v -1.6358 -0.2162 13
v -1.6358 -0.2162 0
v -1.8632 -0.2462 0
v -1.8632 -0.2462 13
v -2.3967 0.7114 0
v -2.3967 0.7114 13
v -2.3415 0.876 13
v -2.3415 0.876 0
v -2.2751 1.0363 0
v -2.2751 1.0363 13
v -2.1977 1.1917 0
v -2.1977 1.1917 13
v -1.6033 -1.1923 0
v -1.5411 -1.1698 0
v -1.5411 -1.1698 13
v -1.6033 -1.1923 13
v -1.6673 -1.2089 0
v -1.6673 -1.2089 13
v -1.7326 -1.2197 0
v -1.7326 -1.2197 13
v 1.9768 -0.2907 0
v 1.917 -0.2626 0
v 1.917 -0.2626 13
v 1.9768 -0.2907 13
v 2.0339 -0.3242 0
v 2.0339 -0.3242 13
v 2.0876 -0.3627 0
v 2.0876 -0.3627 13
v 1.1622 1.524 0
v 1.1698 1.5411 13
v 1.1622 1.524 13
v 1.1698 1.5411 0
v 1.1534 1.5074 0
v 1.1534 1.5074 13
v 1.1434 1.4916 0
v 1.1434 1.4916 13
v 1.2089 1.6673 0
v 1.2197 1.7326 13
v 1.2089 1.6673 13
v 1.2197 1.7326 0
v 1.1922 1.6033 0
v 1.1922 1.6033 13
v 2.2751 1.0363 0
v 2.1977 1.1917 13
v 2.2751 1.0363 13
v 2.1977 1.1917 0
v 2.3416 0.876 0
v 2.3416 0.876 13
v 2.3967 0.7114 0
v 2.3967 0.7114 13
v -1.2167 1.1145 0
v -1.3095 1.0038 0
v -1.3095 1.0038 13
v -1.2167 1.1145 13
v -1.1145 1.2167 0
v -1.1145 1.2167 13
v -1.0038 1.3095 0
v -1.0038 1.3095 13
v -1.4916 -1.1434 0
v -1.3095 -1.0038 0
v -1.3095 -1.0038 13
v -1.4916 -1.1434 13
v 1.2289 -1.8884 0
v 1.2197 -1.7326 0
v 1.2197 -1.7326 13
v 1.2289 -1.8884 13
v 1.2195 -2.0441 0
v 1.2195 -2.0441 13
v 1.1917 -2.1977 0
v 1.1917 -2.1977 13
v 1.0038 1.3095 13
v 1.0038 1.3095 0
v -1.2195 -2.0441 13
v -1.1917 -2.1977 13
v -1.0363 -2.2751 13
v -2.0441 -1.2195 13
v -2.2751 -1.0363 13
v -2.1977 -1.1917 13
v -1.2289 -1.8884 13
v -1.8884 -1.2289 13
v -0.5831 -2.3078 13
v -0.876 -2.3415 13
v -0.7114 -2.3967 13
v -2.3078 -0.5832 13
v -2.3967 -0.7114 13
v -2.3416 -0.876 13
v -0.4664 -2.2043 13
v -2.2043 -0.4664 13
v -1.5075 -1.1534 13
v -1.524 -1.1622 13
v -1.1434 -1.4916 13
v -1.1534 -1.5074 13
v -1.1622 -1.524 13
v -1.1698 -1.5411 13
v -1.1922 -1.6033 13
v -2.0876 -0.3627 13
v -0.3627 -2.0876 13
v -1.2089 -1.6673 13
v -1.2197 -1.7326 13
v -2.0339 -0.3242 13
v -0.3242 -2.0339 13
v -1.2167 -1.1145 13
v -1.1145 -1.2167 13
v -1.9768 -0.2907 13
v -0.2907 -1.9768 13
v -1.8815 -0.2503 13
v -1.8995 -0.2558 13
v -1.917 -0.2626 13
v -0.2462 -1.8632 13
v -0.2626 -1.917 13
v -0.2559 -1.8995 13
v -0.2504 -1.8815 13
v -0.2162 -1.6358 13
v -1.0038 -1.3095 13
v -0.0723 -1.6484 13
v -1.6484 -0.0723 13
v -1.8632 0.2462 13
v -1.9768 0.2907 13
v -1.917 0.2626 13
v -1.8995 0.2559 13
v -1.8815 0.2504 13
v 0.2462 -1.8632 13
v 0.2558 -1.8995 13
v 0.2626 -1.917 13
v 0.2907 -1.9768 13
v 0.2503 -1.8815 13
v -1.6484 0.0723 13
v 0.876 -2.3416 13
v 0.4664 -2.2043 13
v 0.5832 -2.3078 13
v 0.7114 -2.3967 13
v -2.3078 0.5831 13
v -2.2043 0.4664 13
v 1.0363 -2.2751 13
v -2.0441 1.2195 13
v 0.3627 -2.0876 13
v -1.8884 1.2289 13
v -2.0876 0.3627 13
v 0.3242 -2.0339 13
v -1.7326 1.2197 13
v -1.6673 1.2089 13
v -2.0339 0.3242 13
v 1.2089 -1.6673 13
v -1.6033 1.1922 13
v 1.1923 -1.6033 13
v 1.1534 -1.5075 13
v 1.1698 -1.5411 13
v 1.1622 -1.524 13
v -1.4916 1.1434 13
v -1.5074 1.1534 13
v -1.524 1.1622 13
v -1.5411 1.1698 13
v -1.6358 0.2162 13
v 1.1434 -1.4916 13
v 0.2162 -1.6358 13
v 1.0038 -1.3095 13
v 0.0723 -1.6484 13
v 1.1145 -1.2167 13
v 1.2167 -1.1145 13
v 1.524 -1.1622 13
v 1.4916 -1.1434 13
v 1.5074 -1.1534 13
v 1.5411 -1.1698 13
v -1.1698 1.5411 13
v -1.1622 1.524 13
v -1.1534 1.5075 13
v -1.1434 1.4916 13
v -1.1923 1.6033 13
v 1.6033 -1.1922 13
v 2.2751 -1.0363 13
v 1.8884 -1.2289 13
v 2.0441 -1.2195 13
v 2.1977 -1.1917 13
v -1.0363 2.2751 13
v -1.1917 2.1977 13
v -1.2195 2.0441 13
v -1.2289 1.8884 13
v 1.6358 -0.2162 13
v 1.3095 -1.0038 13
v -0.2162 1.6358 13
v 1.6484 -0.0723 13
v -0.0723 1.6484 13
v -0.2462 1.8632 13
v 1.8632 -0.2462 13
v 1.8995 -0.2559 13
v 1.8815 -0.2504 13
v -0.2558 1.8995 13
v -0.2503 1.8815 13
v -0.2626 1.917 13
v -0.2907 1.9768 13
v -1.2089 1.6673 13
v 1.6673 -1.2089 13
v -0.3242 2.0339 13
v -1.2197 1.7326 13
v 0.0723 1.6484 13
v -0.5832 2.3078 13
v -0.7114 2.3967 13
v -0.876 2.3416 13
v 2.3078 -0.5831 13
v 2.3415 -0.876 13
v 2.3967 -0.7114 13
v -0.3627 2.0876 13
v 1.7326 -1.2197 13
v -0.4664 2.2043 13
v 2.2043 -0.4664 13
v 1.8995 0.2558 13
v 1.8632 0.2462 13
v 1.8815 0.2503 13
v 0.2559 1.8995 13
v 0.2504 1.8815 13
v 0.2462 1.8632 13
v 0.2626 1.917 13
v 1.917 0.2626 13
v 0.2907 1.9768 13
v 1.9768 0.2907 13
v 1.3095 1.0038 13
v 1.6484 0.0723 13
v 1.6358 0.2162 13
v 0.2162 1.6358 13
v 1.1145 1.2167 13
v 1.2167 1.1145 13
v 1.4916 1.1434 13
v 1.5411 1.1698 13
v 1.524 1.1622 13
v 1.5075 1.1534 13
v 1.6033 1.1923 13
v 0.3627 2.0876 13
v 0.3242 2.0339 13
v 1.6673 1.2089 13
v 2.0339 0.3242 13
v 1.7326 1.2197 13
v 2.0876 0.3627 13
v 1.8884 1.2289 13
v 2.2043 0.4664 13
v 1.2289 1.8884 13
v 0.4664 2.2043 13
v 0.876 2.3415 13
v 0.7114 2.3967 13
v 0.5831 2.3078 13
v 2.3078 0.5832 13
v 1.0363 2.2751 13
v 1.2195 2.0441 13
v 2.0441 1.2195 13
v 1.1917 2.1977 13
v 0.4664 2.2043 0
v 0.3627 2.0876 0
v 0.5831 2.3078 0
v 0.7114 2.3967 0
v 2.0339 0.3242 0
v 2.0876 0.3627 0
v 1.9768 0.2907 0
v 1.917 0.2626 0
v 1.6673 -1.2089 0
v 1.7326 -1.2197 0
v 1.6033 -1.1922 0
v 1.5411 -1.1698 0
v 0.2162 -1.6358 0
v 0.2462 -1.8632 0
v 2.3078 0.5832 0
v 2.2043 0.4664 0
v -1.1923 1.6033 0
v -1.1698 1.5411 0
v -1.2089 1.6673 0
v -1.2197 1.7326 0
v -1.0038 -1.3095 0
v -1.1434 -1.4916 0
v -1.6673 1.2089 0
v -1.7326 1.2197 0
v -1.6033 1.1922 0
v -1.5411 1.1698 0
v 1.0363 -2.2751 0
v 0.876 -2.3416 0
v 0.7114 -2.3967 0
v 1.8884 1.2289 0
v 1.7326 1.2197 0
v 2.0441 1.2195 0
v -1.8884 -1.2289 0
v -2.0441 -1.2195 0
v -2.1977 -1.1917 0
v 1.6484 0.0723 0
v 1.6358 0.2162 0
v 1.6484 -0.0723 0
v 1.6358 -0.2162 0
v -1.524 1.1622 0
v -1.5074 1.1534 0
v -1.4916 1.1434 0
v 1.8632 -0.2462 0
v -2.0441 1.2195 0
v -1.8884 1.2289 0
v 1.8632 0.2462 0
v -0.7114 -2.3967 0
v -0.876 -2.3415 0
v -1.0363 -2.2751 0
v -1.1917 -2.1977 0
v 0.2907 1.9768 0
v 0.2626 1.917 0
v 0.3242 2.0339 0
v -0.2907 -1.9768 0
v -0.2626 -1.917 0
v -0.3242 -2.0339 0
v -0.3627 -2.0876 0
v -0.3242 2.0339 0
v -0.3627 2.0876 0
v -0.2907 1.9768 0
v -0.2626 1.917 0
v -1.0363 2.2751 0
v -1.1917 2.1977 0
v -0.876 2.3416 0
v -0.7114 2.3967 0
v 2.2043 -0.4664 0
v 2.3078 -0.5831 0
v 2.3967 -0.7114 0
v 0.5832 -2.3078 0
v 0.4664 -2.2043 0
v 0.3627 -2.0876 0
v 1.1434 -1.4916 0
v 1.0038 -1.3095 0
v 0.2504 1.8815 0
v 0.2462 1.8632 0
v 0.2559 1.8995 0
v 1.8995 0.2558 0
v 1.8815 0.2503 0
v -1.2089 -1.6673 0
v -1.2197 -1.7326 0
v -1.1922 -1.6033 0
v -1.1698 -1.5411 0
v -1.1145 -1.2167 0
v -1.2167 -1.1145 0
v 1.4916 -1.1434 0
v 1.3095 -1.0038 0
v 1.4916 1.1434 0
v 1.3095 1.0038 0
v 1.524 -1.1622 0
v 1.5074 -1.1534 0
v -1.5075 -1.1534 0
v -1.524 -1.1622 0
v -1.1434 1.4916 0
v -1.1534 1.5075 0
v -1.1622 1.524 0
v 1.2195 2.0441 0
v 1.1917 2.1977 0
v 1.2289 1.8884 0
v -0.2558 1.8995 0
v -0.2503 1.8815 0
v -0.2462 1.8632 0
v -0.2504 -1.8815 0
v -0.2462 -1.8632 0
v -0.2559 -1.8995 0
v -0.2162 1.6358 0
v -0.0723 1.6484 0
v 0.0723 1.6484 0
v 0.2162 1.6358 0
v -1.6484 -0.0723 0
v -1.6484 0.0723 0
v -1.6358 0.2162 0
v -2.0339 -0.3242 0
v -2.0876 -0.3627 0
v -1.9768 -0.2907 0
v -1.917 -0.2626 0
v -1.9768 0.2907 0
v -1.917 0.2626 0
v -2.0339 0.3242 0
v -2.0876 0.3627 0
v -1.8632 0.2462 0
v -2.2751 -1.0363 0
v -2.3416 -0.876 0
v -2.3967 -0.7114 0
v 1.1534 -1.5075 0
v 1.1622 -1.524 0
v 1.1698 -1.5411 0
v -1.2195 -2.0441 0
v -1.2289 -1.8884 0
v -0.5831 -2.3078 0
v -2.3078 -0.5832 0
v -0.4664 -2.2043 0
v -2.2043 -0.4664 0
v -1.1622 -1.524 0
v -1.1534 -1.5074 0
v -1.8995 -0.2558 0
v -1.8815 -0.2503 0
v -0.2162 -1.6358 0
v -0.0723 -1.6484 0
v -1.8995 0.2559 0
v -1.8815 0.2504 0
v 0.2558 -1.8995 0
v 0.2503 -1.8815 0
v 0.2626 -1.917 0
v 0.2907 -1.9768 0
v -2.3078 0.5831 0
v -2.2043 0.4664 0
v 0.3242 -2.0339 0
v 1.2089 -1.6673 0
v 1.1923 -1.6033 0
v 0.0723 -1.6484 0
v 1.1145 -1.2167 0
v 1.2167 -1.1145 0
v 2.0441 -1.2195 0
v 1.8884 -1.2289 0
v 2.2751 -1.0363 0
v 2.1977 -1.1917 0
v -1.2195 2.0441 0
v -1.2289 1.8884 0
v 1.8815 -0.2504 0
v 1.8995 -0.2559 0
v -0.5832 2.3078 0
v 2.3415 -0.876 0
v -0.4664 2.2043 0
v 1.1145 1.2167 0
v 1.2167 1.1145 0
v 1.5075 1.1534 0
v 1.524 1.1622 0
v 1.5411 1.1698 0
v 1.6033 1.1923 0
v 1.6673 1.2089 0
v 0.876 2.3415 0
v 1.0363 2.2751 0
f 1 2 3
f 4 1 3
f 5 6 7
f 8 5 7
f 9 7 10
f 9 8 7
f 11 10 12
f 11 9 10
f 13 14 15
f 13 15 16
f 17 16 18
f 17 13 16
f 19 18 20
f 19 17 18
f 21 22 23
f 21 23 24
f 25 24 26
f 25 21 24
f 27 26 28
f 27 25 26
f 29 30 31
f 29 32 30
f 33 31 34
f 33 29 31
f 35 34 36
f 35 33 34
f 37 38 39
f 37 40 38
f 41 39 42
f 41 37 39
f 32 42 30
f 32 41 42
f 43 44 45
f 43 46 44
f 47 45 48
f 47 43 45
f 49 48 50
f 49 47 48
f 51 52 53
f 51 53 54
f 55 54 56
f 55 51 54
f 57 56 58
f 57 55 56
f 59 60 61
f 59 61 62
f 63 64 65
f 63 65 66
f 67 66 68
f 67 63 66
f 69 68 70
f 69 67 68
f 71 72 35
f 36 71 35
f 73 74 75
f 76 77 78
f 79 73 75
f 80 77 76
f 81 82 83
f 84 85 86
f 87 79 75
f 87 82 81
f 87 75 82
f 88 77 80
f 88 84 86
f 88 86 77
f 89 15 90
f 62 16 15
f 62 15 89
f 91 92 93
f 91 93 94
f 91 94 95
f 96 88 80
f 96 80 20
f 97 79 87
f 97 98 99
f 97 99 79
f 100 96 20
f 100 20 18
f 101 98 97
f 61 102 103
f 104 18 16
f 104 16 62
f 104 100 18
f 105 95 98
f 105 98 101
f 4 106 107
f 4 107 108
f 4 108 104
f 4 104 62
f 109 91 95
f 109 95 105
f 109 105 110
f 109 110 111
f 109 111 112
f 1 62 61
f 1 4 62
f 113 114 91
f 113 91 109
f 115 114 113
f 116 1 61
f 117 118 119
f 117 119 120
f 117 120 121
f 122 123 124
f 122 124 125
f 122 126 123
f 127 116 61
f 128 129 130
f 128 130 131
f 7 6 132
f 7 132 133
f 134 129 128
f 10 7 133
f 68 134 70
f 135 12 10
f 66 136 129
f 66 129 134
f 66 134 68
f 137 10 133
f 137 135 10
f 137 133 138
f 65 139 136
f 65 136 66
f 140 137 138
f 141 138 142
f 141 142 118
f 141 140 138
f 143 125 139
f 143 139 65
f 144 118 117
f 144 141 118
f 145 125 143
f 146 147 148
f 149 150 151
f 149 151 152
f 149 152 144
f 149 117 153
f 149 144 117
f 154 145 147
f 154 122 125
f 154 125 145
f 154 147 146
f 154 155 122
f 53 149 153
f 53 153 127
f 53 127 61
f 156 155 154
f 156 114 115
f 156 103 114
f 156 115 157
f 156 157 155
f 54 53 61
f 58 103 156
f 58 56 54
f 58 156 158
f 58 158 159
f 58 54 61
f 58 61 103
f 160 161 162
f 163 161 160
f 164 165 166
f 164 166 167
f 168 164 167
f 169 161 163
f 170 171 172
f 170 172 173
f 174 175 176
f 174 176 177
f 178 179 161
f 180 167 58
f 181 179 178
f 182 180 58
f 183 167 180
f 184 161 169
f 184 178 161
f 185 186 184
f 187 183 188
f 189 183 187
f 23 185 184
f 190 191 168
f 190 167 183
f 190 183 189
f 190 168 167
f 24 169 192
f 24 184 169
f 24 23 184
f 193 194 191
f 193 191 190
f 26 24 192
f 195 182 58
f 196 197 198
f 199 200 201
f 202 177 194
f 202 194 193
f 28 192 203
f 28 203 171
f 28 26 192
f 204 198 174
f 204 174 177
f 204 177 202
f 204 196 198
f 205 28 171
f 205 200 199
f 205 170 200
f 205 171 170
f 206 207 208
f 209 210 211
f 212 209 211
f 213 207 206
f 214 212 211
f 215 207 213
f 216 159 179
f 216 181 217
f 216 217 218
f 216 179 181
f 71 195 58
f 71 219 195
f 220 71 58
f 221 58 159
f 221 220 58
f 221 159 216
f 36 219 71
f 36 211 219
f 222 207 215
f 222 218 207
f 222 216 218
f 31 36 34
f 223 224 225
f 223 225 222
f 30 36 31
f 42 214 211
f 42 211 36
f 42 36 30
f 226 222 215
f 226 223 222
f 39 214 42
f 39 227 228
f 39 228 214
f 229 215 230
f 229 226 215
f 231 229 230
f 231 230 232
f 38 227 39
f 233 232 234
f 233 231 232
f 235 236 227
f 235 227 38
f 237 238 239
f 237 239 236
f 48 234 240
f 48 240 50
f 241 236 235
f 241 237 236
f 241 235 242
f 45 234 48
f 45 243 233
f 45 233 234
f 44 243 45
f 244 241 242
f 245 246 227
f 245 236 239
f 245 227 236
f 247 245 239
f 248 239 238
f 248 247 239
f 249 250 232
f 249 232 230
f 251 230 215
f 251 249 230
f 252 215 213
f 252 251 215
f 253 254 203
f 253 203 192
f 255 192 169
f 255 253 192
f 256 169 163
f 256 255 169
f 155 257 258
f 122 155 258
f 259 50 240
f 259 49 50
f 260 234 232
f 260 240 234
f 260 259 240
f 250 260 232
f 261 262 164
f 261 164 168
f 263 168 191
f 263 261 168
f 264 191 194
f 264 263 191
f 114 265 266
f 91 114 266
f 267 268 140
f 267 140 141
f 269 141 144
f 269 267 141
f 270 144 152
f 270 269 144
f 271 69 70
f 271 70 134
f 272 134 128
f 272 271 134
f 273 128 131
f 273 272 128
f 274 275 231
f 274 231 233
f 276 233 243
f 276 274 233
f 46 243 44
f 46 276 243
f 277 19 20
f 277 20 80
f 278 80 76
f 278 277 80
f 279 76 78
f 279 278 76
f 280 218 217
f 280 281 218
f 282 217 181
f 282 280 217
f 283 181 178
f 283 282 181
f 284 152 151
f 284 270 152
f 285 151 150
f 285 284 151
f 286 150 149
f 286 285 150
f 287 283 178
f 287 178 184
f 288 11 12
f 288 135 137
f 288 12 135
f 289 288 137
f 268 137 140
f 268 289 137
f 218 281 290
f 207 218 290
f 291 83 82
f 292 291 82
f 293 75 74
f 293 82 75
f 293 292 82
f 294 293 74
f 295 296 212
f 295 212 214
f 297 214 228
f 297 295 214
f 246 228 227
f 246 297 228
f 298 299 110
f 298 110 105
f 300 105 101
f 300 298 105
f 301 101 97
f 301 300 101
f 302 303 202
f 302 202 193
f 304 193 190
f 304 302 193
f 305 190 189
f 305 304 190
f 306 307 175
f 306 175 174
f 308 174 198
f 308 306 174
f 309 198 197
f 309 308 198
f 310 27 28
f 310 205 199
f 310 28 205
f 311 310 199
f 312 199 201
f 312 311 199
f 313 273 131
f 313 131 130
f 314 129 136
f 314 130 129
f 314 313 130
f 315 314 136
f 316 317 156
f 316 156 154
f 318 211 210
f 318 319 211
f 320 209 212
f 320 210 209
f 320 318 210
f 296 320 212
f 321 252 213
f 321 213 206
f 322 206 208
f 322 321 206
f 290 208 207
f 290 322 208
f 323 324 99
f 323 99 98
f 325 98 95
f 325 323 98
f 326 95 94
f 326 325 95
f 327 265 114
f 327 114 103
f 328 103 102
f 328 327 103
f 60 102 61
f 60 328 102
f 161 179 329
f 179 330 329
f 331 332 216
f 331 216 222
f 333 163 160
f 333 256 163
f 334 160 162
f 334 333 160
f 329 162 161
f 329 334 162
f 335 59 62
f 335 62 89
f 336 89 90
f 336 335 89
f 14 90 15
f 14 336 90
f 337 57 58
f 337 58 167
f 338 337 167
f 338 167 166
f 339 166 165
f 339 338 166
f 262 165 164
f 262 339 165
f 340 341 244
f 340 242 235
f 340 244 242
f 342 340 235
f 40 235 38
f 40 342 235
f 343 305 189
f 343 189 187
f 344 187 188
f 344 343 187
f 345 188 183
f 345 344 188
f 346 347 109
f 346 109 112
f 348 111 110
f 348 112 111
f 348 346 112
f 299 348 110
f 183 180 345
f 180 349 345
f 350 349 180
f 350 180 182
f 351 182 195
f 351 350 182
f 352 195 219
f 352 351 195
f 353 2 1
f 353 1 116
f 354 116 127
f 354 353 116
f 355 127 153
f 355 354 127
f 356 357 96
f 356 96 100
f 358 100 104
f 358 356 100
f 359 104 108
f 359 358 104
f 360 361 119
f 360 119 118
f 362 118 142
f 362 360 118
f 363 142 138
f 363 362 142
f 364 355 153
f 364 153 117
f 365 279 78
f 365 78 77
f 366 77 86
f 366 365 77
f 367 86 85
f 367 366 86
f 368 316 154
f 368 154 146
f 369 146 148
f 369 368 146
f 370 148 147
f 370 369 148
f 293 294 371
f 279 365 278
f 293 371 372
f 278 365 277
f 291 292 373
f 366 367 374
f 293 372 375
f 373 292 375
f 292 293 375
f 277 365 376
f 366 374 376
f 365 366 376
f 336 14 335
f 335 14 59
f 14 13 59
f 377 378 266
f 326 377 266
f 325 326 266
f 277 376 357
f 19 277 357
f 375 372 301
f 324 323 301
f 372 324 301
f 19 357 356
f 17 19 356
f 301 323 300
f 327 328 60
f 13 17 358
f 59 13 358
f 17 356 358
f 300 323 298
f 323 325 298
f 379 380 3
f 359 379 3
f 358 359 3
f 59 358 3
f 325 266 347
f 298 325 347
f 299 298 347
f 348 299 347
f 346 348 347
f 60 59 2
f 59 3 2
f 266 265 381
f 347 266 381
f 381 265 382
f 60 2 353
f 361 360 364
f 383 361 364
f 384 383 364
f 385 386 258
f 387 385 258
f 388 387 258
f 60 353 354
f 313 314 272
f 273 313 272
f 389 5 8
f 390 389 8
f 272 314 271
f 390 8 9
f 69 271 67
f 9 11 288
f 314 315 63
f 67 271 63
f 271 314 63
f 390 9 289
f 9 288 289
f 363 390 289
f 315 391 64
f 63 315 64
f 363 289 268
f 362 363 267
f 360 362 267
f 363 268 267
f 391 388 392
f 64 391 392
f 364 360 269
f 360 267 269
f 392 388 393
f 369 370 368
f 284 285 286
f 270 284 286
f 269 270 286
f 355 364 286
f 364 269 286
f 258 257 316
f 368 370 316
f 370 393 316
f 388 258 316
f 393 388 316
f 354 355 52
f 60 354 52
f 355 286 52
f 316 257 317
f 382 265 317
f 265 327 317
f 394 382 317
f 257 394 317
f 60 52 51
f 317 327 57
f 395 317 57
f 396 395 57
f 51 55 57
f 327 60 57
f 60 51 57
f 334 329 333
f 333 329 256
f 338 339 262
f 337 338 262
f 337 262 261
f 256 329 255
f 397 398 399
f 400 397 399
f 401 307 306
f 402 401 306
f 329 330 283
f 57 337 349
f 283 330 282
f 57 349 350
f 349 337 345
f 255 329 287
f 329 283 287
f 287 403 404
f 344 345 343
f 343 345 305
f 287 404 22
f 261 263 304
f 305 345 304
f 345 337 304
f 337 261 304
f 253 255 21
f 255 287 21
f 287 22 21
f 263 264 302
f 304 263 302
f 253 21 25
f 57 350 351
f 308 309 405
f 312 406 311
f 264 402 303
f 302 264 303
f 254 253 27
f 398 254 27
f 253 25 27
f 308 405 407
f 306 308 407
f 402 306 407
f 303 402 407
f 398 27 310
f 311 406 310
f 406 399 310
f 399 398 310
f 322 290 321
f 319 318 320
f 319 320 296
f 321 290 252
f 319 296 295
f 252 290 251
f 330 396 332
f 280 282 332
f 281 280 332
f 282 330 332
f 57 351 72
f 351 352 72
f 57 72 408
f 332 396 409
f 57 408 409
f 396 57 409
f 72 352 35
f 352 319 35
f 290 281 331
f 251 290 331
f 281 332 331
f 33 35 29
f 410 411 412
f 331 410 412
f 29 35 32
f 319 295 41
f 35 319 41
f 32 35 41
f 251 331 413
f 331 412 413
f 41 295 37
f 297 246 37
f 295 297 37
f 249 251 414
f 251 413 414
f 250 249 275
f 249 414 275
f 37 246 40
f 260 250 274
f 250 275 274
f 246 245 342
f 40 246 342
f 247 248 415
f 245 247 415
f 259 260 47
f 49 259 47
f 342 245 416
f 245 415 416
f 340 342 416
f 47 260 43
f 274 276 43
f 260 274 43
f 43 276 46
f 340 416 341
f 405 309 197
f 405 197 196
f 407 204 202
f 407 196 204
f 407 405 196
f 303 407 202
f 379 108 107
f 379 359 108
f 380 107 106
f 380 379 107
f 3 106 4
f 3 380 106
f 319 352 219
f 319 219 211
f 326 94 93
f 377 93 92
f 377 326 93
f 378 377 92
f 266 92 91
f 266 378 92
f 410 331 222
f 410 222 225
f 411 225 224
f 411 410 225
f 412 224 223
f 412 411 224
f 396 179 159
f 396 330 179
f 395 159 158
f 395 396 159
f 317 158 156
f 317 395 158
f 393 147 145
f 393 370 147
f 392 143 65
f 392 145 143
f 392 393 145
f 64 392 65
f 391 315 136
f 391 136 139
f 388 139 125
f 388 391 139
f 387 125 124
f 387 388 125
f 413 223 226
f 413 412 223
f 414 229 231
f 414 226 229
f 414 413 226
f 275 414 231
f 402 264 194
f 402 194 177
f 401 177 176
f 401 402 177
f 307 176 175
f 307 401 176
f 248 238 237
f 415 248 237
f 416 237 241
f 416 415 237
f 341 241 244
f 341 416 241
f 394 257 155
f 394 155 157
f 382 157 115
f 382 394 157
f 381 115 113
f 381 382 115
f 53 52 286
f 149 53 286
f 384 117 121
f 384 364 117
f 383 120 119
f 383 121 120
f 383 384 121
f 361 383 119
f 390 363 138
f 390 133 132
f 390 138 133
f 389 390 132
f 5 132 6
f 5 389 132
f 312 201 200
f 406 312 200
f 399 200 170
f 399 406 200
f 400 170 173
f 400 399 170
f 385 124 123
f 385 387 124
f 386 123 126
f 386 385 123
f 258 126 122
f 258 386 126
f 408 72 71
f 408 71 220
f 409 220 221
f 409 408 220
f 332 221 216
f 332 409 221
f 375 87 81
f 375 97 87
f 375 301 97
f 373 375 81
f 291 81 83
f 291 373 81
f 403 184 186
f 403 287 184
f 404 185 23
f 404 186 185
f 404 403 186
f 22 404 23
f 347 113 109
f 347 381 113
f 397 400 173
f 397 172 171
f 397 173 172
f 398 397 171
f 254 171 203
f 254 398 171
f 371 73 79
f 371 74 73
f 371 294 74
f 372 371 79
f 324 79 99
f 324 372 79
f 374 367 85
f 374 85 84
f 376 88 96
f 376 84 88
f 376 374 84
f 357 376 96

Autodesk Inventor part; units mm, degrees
ref_plane "YZ Plane" through (0, 0, 0) normal (1, 0, 0) x (0, 1, 0)
ref_plane "XZ Plane" through (0, 0, 0) normal (0, 1, 0) x (-1, 0, 0)
ref_plane "XY Plane" through (0, 0, 0) normal (0, 0, 1) x (1, 0, 0)
sketch "Sketch2" plane through (0, 0, 0) normal (0, 0, 1) x (1, 0, 0)
  arc A0 (0.2626, 1.917) -> (0.2462, 1.8632) centre (0.4994, 1.8157) ccw
  arc A1 (0.3627, 2.0876) -> (0.2626, 1.917) centre (0.9307, 1.6395) ccw
  arc A2 (0.7114, 2.3967) -> (0.3627, 2.0876) centre (1.3933, 1.2761) ccw
  arc A3 (-1.1698, 1.5411) -> (-1.1434, 1.4916) centre (-0.9308, 1.637) ccw
  arc A4 (-1.2197, 1.7326) -> (-1.1698, 1.5411) centre (-0.5012, 1.8175) ccw
  arc A5 (-1.1917, 2.1977) -> (-1.2197, 1.7326) centre (0.0829, 1.8876) ccw
  arc A6 (-1.917, 0.2626) -> (-1.8632, 0.2462) centre (-1.8157, 0.4994) ccw
  arc A7 (-2.0876, 0.3627) -> (-1.917, 0.2626) centre (-1.6395, 0.9307) ccw
  arc A8 (-2.3967, 0.7114) -> (-2.0876, 0.3627) centre (-1.2761, 1.3933) ccw
  arc A9 (-1.5411, -1.1698) -> (-1.4916, -1.1434) centre (-1.637, -0.9308) ccw
  arc A10 (-1.7326, -1.2197) -> (-1.5411, -1.1698) centre (-1.8175, -0.5012) ccw
  arc A11 (-2.1977, -1.1917) -> (-1.7326, -1.2197) centre (-1.8876, 0.0829) ccw
  arc A12 (-0.2626, -1.917) -> (-0.2462, -1.8632) centre (-0.4994, -1.8157) ccw
  arc A13 (-0.3627, -2.0876) -> (-0.2626, -1.917) centre (-0.9307, -1.6395) ccw
  arc A14 (-0.7114, -2.3967) -> (-0.3627, -2.0876) centre (-1.3933, -1.2761) ccw
  arc A15 (1.1698, -1.5411) -> (1.1434, -1.4916) centre (0.9308, -1.637) ccw
  arc A16 (1.2197, -1.7326) -> (1.1698, -1.5411) centre (0.5012, -1.8175) ccw
  arc A17 (1.1917, -2.1977) -> (1.2197, -1.7326) centre (-0.0829, -1.8876) ccw
  arc A18 (1.917, -0.2626) -> (1.8632, -0.2462) centre (1.8157, -0.4994) ccw
  arc A19 (2.0876, -0.3627) -> (1.917, -0.2626) centre (1.6395, -0.9307) ccw
  arc A20 (2.3967, -0.7114) -> (2.0876, -0.3627) centre (1.2761, -1.3933) ccw
  arc A21 (1.5411, 1.1698) -> (1.4916, 1.1434) centre (1.637, 0.9308) ccw
  arc A22 (1.7326, 1.2197) -> (1.5411, 1.1698) centre (1.8175, 0.5012) ccw
  arc A23 (2.1977, 1.1917) -> (1.7326, 1.2197) centre (1.8876, -0.0829) ccw
  arc A24 (-0.2462, 1.8632) -> (-0.2626, 1.917) centre (-0.4994, 1.8157) ccw
  arc A25 (-0.2626, 1.917) -> (-0.3627, 2.0876) centre (-0.9307, 1.6395) ccw
  arc A26 (-0.3627, 2.0876) -> (-0.7114, 2.3967) centre (-1.3933, 1.2761) ccw
  arc A27 (-1.4916, 1.1434) -> (-1.5411, 1.1698) centre (-1.637, 0.9308) ccw
  arc A28 (-1.5411, 1.1698) -> (-1.7326, 1.2197) centre (-1.8175, 0.5012) ccw
  arc A29 (-1.7326, 1.2197) -> (-2.1977, 1.1917) centre (-1.8876, -0.0829) ccw
  arc A30 (-1.8632, -0.2462) -> (-1.917, -0.2626) centre (-1.8157, -0.4994) ccw
  arc A31 (-1.917, -0.2626) -> (-2.0876, -0.3627) centre (-1.6395, -0.9307) ccw
  arc A32 (-2.0876, -0.3627) -> (-2.3967, -0.7114) centre (-1.2761, -1.3933) ccw
  arc A33 (-1.1434, -1.4916) -> (-1.1698, -1.5411) centre (-0.9308, -1.637) ccw
  arc A34 (-1.1698, -1.5411) -> (-1.2197, -1.7326) centre (-0.5012, -1.8175) ccw
  arc A35 (-1.2197, -1.7326) -> (-1.1917, -2.1977) centre (0.0829, -1.8876) ccw
  arc A36 (0.2462, -1.8632) -> (0.2626, -1.917) centre (0.4994, -1.8157) ccw
  arc A37 (0.2626, -1.917) -> (0.3627, -2.0876) centre (0.9307, -1.6395) ccw
  arc A38 (0.3627, -2.0876) -> (0.7114, -2.3967) centre (1.3933, -1.2761) ccw
  arc A39 (1.4916, -1.1434) -> (1.5411, -1.1698) centre (1.637, -0.9308) ccw
  arc A40 (1.5411, -1.1698) -> (1.7326, -1.2197) centre (1.8175, -0.5012) ccw
  arc A41 (1.7326, -1.2197) -> (2.1977, -1.1917) centre (1.8876, 0.0829) ccw
  arc A42 (1.8632, 0.2462) -> (1.917, 0.2626) centre (1.8157, 0.4994) ccw
  arc A43 (1.917, 0.2626) -> (2.0876, 0.3627) centre (1.6395, 0.9307) ccw
  arc A44 (2.0876, 0.3627) -> (2.3967, 0.7114) centre (1.2761, 1.3933) ccw
  arc A45 (1.1434, 1.4916) -> (1.1698, 1.5411) centre (0.9308, 1.637) ccw
  arc A46 (1.1698, 1.5411) -> (1.2197, 1.7326) centre (0.5012, 1.8175) ccw
  arc A47 (1.2197, 1.7326) -> (1.1917, 2.1977) centre (-0.0829, 1.8876) ccw
  arc A48 (0.2162, 1.6358) -> (-0.2162, 1.6358) centre (0, 0) ccw
  arc A49 (-1.0038, 1.3095) -> (-1.3095, 1.0038) centre (0, 0) ccw
  arc A50 (-1.6358, 0.2162) -> (-1.6358, -0.2162) centre (0, 0) ccw
  arc A51 (-1.3095, -1.0038) -> (-1.0038, -1.3095) centre (0, 0) ccw
  arc A52 (-0.2162, -1.6358) -> (0.2162, -1.6358) centre (0, 0) ccw
  arc A53 (1.0038, -1.3095) -> (1.3095, -1.0038) centre (0, 0) ccw
  arc A54 (1.6358, -0.2162) -> (1.6358, 0.2162) centre (0, 0) ccw
  arc A55 (1.3095, 1.0038) -> (1.0038, 1.3095) centre (0, 0) ccw
  arc A56 (-0.7114, 2.3967) -> (-1.1917, 2.1977) centre (0, 0) ccw
  arc A57 (-2.1977, 1.1917) -> (-2.3967, 0.7114) centre (0, 0) ccw
  arc A58 (-2.3967, -0.7114) -> (-2.1977, -1.1917) centre (0, 0) ccw
  arc A59 (-1.1917, -2.1977) -> (-0.7114, -2.3967) centre (0, 0) ccw
  arc A60 (0.7114, -2.3967) -> (1.1917, -2.1977) centre (0, 0) ccw
  arc A61 (2.1977, -1.1917) -> (2.3967, -0.7114) centre (0, 0) ccw
  arc A62 (2.3967, 0.7114) -> (2.1977, 1.1917) centre (0, 0) ccw
  arc A63 (1.1917, 2.1977) -> (0.7114, 2.3967) centre (0, 0) ccw
  line L0 (0.2162, 1.6358) -> (0.2462, 1.8632)
  line L1 (-1.0038, 1.3095) -> (-1.1434, 1.4916)
  line L2 (-1.6358, 0.2162) -> (-1.8632, 0.2462)
  line L3 (-1.3095, -1.0038) -> (-1.4916, -1.1434)
  line L4 (-0.2162, -1.6358) -> (-0.2462, -1.8632)
  line L5 (1.0038, -1.3095) -> (1.1434, -1.4916)
  line L6 (1.6358, -0.2162) -> (1.8632, -0.2462)
  line L7 (1.3095, 1.0038) -> (1.4916, 1.1434)
  line L8 (-0.2162, 1.6358) -> (-0.2462, 1.8632)
  line L9 (-1.3095, 1.0038) -> (-1.4916, 1.1434)
  line L10 (-1.6358, -0.2162) -> (-1.8632, -0.2462)
  line L11 (-1.0038, -1.3095) -> (-1.1434, -1.4916)
  line L12 (0.2162, -1.6358) -> (0.2462, -1.8632)
  line L13 (1.3095, -1.0038) -> (1.4916, -1.1434)
  line L14 (1.6358, 0.2162) -> (1.8632, 0.2462)
  line L15 (1.0038, 1.3095) -> (1.1434, 1.4916)
  point P0 (1.3095, 1.0038)
  point P1 (1.0038, 1.3095)
  point P2 (1.1434, 1.4916)
  point P3 (1.1683, 1.5373)
  point P4 (1.2195, 1.7312)
  point P5 (1.1917, 2.1977)
  point P6 (0.7114, 2.3967)
  point P7 (0.3618, 2.0865)
  point P8 (0.261, 1.9131)
  point P9 (0.2462, 1.8632)
  point P10 (0.2162, 1.6358)
  point P11 (-0.2162, 1.6358)
  point P12 (-0.2462, 1.8632)
  point P13 (-0.261, 1.9131)
  point P14 (-0.3618, 2.0865)
  point P15 (-0.7114, 2.3967)
  point P16 (-1.1917, 2.1977)
  point P17 (-1.2195, 1.7312)
  point P18 (-1.1683, 1.5373)
  point P19 (-1.1434, 1.4916)
  point P20 (-1.0038, 1.3095)
  point P21 (-1.3095, 1.0038)
  point P22 (-1.4916, 1.1434)
  point P23 (-1.5373, 1.1683)
  point P24 (-1.7312, 1.2195)
  point P25 (-2.1977, 1.1917)
  point P26 (-2.3967, 0.7114)
  point P27 (-2.0865, 0.3618)
  point P28 (-1.9131, 0.261)
  point P29 (-1.8632, 0.2462)
  point P30 (-1.6358, 0.2162)
  point P31 (-1.6358, -0.2162)
  point P32 (-1.8632, -0.2462)
  point P33 (-1.9131, -0.261)
  point P34 (-2.0865, -0.3618)
  point P35 (-2.3967, -0.7114)
  point P36 (-2.1977, -1.1917)
  point P37 (-1.7312, -1.2195)
  point P38 (-1.5373, -1.1683)
  point P39 (-1.4916, -1.1434)
  point P40 (-1.3095, -1.0038)
  point P41 (-1.0038, -1.3095)
  point P42 (-1.1434, -1.4916)
  point P43 (-1.1683, -1.5373)
  point P44 (-1.2195, -1.7312)
  point P45 (-1.1917, -2.1977)
  point P46 (-0.7114, -2.3967)
  point P47 (-0.3618, -2.0865)
  point P48 (-0.261, -1.9131)
  point P49 (-0.2462, -1.8632)
  point P50 (-0.2162, -1.6358)
  point P51 (0.2162, -1.6358)
  point P52 (0.2462, -1.8632)
  point P53 (0.261, -1.9131)
  point P54 (0.3618, -2.0865)
  point P55 (0.7114, -2.3967)
  point P56 (1.1917, -2.1977)
  point P57 (1.2195, -1.7312)
  point P58 (1.1683, -1.5373)
  point P59 (1.1434, -1.4916)
  point P60 (1.0038, -1.3095)
  point P61 (1.3095, -1.0038)
  point P62 (1.4916, -1.1434)
  point P63 (1.5373, -1.1683)
  point P64 (1.7312, -1.2195)
  point P65 (2.1977, -1.1917)
  point P66 (2.3967, -0.7114)
  point P67 (2.0865, -0.3618)
  point P68 (1.9131, -0.261)
  point P69 (1.8632, -0.2462)
  point P70 (1.6358, -0.2162)
  point P71 (1.6358, 0.2162)
  point P72 (1.8632, 0.2462)
  point P73 (1.9131, 0.261)
  point P74 (2.0865, 0.3618)
  point P75 (2.3967, 0.7114)
  point P76 (2.1977, 1.1917)
  point P77 (1.7312, 1.2195)
  point P78 (1.5373, 1.1683)
  point P79 (1.4916, 1.1434)
extrude "Extrusion2" add sketch "Sketch2" along normal blind 13
properties part number "ぴにょん" material "Aluminum 2014-T6"
